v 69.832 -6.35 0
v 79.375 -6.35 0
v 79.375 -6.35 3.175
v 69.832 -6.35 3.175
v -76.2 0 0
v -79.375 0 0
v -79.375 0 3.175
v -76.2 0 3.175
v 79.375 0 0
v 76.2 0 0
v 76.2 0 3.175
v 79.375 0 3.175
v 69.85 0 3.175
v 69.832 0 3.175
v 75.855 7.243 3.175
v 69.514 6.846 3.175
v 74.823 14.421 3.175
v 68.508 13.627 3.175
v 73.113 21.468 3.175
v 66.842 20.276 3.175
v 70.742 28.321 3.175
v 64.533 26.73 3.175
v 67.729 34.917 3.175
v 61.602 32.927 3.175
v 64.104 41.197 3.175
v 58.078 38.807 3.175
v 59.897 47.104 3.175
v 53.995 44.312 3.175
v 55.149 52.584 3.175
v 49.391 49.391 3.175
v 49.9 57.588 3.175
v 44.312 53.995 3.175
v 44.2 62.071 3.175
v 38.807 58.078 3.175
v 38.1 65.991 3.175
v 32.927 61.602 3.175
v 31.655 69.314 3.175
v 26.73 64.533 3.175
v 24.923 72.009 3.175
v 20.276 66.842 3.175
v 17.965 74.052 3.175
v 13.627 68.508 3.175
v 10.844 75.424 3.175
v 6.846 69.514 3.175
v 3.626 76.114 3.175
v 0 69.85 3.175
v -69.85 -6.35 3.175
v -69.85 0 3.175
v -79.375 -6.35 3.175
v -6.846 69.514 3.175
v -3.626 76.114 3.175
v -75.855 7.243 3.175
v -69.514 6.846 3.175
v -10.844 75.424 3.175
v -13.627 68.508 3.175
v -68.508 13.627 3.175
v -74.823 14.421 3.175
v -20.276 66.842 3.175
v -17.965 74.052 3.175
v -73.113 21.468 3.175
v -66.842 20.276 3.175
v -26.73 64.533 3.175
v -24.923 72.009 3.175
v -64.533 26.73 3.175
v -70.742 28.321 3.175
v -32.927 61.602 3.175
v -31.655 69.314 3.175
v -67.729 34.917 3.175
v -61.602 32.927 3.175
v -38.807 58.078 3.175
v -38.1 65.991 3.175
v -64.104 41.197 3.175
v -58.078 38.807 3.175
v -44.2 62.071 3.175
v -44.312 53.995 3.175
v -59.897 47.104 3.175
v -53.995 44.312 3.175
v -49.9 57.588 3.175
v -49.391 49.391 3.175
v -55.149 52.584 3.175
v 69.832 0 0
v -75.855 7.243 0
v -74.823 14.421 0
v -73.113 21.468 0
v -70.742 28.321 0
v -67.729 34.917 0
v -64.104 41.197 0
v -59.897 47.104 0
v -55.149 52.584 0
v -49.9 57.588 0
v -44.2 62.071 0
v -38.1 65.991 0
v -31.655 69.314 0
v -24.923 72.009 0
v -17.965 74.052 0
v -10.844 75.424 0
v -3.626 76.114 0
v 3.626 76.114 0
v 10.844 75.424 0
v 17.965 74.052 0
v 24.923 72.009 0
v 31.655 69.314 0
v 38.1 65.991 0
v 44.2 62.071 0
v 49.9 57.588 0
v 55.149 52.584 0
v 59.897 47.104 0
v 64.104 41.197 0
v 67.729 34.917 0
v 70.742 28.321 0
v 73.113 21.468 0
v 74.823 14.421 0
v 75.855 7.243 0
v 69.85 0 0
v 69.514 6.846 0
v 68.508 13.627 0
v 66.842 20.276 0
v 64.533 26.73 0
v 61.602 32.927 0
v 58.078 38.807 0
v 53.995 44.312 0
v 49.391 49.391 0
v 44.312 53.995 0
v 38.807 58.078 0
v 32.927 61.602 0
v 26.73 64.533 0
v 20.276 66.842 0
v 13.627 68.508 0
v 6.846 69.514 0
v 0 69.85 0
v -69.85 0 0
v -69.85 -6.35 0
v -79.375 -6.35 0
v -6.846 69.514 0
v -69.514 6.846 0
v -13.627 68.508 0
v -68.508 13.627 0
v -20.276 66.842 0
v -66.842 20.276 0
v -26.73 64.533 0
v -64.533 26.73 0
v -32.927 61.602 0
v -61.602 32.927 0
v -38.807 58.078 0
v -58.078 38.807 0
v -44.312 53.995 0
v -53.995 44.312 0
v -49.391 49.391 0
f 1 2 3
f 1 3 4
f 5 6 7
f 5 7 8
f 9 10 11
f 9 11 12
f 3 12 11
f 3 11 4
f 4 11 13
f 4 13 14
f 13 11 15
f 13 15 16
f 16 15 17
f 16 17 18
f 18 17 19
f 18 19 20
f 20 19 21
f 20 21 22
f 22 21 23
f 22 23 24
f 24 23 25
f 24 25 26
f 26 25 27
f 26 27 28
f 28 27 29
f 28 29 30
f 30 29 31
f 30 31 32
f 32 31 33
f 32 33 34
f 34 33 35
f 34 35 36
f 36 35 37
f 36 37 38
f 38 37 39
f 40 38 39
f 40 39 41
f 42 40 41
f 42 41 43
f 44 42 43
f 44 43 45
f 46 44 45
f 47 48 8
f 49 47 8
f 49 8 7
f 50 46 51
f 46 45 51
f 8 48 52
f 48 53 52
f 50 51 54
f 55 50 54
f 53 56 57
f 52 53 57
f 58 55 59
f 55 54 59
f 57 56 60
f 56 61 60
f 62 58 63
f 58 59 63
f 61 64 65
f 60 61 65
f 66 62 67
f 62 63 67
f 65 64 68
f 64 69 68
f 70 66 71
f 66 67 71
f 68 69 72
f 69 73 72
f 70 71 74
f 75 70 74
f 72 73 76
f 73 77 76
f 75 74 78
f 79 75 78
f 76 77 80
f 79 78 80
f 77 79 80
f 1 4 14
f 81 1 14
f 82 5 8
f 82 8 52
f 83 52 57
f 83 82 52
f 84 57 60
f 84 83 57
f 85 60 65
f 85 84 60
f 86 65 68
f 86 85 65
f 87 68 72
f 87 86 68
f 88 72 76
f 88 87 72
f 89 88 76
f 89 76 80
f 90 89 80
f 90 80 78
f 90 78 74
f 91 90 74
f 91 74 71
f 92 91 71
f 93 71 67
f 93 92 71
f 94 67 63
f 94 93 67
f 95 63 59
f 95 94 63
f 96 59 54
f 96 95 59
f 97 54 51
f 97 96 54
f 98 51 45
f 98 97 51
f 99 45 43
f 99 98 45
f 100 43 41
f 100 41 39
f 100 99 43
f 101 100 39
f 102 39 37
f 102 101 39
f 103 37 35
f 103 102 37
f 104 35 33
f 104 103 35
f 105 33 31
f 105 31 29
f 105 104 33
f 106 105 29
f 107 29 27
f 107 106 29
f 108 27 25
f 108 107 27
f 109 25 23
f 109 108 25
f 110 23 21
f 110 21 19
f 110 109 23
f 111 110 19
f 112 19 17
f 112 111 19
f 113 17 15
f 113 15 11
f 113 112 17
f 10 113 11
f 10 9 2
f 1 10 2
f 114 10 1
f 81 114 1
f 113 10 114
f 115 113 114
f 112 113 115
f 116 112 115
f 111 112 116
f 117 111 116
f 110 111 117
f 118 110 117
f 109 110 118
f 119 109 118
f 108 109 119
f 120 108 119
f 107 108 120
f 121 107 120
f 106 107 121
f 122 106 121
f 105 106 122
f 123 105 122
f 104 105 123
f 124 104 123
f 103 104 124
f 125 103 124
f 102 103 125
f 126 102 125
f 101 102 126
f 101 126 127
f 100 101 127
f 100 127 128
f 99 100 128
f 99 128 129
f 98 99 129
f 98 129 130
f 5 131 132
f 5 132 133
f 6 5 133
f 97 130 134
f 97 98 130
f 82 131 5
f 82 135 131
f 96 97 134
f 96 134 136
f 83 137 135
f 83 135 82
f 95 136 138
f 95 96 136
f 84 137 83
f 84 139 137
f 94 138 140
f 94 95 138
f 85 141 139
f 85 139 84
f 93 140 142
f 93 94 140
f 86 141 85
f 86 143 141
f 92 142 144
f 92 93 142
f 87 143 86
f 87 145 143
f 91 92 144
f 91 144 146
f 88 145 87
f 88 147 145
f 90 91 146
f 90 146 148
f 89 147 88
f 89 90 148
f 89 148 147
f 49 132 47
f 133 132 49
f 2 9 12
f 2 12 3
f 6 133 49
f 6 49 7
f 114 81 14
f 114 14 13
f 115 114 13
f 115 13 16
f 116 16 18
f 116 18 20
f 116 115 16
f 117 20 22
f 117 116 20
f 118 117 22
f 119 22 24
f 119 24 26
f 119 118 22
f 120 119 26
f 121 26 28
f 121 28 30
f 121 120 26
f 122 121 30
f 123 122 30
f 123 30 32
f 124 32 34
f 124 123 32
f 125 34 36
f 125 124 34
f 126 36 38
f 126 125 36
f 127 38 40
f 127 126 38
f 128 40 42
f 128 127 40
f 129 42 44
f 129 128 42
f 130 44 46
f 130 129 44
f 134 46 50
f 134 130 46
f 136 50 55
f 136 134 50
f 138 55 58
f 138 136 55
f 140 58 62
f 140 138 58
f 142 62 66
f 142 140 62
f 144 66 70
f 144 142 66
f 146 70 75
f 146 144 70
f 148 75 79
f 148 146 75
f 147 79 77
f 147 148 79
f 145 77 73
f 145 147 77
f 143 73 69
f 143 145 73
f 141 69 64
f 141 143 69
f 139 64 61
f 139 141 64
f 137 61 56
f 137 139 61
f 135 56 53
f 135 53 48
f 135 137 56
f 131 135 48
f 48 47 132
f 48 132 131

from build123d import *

# Parameters (mm, degrees)
BOSS_EXTRUDE1_DEPTH = 3.175
SKETCH2_W           = 139.682423128
SKETCH2_H           = 6.35
CUT_EXTRUDE1_DEPTH  = 4.175


with BuildPart() as part:
    # Sketch1 → Boss-Extrude1 (new body)
    with BuildSketch(Plane.XY):
        with BuildLine():
            Line((76.2, 0), (79.375, 0))
            Line((79.375, 0), (79.375, -6.35))
            Line((79.375, -6.35), (-79.375, -6.35))
            Line((-79.375, -6.35), (-79.375, 0))
            Line((-79.375, 0), (-76.2, 0))
            ThreePointArc((-76.2, 0), (0, 76.2), (76.2, 0))
        make_face()
        with BuildLine():
            Line((-69.85, 0), (69.85, 0))
            ThreePointArc((69.85, 0), (0, 69.85), (-69.85, 0))
        make_face(mode=Mode.SUBTRACT)
    extrude(amount=BOSS_EXTRUDE1_DEPTH)

    # Sketch2 → Cut-Extrude1 (cut, through all)
    with BuildSketch(Plane.XY.offset(3.175)):
        with Locations((-0.008788436, -3.175)):
            Rectangle(SKETCH2_W, SKETCH2_H)
    extrude(amount=-CUT_EXTRUDE1_DEPTH, mode=Mode.SUBTRACT)


solid = part.part
